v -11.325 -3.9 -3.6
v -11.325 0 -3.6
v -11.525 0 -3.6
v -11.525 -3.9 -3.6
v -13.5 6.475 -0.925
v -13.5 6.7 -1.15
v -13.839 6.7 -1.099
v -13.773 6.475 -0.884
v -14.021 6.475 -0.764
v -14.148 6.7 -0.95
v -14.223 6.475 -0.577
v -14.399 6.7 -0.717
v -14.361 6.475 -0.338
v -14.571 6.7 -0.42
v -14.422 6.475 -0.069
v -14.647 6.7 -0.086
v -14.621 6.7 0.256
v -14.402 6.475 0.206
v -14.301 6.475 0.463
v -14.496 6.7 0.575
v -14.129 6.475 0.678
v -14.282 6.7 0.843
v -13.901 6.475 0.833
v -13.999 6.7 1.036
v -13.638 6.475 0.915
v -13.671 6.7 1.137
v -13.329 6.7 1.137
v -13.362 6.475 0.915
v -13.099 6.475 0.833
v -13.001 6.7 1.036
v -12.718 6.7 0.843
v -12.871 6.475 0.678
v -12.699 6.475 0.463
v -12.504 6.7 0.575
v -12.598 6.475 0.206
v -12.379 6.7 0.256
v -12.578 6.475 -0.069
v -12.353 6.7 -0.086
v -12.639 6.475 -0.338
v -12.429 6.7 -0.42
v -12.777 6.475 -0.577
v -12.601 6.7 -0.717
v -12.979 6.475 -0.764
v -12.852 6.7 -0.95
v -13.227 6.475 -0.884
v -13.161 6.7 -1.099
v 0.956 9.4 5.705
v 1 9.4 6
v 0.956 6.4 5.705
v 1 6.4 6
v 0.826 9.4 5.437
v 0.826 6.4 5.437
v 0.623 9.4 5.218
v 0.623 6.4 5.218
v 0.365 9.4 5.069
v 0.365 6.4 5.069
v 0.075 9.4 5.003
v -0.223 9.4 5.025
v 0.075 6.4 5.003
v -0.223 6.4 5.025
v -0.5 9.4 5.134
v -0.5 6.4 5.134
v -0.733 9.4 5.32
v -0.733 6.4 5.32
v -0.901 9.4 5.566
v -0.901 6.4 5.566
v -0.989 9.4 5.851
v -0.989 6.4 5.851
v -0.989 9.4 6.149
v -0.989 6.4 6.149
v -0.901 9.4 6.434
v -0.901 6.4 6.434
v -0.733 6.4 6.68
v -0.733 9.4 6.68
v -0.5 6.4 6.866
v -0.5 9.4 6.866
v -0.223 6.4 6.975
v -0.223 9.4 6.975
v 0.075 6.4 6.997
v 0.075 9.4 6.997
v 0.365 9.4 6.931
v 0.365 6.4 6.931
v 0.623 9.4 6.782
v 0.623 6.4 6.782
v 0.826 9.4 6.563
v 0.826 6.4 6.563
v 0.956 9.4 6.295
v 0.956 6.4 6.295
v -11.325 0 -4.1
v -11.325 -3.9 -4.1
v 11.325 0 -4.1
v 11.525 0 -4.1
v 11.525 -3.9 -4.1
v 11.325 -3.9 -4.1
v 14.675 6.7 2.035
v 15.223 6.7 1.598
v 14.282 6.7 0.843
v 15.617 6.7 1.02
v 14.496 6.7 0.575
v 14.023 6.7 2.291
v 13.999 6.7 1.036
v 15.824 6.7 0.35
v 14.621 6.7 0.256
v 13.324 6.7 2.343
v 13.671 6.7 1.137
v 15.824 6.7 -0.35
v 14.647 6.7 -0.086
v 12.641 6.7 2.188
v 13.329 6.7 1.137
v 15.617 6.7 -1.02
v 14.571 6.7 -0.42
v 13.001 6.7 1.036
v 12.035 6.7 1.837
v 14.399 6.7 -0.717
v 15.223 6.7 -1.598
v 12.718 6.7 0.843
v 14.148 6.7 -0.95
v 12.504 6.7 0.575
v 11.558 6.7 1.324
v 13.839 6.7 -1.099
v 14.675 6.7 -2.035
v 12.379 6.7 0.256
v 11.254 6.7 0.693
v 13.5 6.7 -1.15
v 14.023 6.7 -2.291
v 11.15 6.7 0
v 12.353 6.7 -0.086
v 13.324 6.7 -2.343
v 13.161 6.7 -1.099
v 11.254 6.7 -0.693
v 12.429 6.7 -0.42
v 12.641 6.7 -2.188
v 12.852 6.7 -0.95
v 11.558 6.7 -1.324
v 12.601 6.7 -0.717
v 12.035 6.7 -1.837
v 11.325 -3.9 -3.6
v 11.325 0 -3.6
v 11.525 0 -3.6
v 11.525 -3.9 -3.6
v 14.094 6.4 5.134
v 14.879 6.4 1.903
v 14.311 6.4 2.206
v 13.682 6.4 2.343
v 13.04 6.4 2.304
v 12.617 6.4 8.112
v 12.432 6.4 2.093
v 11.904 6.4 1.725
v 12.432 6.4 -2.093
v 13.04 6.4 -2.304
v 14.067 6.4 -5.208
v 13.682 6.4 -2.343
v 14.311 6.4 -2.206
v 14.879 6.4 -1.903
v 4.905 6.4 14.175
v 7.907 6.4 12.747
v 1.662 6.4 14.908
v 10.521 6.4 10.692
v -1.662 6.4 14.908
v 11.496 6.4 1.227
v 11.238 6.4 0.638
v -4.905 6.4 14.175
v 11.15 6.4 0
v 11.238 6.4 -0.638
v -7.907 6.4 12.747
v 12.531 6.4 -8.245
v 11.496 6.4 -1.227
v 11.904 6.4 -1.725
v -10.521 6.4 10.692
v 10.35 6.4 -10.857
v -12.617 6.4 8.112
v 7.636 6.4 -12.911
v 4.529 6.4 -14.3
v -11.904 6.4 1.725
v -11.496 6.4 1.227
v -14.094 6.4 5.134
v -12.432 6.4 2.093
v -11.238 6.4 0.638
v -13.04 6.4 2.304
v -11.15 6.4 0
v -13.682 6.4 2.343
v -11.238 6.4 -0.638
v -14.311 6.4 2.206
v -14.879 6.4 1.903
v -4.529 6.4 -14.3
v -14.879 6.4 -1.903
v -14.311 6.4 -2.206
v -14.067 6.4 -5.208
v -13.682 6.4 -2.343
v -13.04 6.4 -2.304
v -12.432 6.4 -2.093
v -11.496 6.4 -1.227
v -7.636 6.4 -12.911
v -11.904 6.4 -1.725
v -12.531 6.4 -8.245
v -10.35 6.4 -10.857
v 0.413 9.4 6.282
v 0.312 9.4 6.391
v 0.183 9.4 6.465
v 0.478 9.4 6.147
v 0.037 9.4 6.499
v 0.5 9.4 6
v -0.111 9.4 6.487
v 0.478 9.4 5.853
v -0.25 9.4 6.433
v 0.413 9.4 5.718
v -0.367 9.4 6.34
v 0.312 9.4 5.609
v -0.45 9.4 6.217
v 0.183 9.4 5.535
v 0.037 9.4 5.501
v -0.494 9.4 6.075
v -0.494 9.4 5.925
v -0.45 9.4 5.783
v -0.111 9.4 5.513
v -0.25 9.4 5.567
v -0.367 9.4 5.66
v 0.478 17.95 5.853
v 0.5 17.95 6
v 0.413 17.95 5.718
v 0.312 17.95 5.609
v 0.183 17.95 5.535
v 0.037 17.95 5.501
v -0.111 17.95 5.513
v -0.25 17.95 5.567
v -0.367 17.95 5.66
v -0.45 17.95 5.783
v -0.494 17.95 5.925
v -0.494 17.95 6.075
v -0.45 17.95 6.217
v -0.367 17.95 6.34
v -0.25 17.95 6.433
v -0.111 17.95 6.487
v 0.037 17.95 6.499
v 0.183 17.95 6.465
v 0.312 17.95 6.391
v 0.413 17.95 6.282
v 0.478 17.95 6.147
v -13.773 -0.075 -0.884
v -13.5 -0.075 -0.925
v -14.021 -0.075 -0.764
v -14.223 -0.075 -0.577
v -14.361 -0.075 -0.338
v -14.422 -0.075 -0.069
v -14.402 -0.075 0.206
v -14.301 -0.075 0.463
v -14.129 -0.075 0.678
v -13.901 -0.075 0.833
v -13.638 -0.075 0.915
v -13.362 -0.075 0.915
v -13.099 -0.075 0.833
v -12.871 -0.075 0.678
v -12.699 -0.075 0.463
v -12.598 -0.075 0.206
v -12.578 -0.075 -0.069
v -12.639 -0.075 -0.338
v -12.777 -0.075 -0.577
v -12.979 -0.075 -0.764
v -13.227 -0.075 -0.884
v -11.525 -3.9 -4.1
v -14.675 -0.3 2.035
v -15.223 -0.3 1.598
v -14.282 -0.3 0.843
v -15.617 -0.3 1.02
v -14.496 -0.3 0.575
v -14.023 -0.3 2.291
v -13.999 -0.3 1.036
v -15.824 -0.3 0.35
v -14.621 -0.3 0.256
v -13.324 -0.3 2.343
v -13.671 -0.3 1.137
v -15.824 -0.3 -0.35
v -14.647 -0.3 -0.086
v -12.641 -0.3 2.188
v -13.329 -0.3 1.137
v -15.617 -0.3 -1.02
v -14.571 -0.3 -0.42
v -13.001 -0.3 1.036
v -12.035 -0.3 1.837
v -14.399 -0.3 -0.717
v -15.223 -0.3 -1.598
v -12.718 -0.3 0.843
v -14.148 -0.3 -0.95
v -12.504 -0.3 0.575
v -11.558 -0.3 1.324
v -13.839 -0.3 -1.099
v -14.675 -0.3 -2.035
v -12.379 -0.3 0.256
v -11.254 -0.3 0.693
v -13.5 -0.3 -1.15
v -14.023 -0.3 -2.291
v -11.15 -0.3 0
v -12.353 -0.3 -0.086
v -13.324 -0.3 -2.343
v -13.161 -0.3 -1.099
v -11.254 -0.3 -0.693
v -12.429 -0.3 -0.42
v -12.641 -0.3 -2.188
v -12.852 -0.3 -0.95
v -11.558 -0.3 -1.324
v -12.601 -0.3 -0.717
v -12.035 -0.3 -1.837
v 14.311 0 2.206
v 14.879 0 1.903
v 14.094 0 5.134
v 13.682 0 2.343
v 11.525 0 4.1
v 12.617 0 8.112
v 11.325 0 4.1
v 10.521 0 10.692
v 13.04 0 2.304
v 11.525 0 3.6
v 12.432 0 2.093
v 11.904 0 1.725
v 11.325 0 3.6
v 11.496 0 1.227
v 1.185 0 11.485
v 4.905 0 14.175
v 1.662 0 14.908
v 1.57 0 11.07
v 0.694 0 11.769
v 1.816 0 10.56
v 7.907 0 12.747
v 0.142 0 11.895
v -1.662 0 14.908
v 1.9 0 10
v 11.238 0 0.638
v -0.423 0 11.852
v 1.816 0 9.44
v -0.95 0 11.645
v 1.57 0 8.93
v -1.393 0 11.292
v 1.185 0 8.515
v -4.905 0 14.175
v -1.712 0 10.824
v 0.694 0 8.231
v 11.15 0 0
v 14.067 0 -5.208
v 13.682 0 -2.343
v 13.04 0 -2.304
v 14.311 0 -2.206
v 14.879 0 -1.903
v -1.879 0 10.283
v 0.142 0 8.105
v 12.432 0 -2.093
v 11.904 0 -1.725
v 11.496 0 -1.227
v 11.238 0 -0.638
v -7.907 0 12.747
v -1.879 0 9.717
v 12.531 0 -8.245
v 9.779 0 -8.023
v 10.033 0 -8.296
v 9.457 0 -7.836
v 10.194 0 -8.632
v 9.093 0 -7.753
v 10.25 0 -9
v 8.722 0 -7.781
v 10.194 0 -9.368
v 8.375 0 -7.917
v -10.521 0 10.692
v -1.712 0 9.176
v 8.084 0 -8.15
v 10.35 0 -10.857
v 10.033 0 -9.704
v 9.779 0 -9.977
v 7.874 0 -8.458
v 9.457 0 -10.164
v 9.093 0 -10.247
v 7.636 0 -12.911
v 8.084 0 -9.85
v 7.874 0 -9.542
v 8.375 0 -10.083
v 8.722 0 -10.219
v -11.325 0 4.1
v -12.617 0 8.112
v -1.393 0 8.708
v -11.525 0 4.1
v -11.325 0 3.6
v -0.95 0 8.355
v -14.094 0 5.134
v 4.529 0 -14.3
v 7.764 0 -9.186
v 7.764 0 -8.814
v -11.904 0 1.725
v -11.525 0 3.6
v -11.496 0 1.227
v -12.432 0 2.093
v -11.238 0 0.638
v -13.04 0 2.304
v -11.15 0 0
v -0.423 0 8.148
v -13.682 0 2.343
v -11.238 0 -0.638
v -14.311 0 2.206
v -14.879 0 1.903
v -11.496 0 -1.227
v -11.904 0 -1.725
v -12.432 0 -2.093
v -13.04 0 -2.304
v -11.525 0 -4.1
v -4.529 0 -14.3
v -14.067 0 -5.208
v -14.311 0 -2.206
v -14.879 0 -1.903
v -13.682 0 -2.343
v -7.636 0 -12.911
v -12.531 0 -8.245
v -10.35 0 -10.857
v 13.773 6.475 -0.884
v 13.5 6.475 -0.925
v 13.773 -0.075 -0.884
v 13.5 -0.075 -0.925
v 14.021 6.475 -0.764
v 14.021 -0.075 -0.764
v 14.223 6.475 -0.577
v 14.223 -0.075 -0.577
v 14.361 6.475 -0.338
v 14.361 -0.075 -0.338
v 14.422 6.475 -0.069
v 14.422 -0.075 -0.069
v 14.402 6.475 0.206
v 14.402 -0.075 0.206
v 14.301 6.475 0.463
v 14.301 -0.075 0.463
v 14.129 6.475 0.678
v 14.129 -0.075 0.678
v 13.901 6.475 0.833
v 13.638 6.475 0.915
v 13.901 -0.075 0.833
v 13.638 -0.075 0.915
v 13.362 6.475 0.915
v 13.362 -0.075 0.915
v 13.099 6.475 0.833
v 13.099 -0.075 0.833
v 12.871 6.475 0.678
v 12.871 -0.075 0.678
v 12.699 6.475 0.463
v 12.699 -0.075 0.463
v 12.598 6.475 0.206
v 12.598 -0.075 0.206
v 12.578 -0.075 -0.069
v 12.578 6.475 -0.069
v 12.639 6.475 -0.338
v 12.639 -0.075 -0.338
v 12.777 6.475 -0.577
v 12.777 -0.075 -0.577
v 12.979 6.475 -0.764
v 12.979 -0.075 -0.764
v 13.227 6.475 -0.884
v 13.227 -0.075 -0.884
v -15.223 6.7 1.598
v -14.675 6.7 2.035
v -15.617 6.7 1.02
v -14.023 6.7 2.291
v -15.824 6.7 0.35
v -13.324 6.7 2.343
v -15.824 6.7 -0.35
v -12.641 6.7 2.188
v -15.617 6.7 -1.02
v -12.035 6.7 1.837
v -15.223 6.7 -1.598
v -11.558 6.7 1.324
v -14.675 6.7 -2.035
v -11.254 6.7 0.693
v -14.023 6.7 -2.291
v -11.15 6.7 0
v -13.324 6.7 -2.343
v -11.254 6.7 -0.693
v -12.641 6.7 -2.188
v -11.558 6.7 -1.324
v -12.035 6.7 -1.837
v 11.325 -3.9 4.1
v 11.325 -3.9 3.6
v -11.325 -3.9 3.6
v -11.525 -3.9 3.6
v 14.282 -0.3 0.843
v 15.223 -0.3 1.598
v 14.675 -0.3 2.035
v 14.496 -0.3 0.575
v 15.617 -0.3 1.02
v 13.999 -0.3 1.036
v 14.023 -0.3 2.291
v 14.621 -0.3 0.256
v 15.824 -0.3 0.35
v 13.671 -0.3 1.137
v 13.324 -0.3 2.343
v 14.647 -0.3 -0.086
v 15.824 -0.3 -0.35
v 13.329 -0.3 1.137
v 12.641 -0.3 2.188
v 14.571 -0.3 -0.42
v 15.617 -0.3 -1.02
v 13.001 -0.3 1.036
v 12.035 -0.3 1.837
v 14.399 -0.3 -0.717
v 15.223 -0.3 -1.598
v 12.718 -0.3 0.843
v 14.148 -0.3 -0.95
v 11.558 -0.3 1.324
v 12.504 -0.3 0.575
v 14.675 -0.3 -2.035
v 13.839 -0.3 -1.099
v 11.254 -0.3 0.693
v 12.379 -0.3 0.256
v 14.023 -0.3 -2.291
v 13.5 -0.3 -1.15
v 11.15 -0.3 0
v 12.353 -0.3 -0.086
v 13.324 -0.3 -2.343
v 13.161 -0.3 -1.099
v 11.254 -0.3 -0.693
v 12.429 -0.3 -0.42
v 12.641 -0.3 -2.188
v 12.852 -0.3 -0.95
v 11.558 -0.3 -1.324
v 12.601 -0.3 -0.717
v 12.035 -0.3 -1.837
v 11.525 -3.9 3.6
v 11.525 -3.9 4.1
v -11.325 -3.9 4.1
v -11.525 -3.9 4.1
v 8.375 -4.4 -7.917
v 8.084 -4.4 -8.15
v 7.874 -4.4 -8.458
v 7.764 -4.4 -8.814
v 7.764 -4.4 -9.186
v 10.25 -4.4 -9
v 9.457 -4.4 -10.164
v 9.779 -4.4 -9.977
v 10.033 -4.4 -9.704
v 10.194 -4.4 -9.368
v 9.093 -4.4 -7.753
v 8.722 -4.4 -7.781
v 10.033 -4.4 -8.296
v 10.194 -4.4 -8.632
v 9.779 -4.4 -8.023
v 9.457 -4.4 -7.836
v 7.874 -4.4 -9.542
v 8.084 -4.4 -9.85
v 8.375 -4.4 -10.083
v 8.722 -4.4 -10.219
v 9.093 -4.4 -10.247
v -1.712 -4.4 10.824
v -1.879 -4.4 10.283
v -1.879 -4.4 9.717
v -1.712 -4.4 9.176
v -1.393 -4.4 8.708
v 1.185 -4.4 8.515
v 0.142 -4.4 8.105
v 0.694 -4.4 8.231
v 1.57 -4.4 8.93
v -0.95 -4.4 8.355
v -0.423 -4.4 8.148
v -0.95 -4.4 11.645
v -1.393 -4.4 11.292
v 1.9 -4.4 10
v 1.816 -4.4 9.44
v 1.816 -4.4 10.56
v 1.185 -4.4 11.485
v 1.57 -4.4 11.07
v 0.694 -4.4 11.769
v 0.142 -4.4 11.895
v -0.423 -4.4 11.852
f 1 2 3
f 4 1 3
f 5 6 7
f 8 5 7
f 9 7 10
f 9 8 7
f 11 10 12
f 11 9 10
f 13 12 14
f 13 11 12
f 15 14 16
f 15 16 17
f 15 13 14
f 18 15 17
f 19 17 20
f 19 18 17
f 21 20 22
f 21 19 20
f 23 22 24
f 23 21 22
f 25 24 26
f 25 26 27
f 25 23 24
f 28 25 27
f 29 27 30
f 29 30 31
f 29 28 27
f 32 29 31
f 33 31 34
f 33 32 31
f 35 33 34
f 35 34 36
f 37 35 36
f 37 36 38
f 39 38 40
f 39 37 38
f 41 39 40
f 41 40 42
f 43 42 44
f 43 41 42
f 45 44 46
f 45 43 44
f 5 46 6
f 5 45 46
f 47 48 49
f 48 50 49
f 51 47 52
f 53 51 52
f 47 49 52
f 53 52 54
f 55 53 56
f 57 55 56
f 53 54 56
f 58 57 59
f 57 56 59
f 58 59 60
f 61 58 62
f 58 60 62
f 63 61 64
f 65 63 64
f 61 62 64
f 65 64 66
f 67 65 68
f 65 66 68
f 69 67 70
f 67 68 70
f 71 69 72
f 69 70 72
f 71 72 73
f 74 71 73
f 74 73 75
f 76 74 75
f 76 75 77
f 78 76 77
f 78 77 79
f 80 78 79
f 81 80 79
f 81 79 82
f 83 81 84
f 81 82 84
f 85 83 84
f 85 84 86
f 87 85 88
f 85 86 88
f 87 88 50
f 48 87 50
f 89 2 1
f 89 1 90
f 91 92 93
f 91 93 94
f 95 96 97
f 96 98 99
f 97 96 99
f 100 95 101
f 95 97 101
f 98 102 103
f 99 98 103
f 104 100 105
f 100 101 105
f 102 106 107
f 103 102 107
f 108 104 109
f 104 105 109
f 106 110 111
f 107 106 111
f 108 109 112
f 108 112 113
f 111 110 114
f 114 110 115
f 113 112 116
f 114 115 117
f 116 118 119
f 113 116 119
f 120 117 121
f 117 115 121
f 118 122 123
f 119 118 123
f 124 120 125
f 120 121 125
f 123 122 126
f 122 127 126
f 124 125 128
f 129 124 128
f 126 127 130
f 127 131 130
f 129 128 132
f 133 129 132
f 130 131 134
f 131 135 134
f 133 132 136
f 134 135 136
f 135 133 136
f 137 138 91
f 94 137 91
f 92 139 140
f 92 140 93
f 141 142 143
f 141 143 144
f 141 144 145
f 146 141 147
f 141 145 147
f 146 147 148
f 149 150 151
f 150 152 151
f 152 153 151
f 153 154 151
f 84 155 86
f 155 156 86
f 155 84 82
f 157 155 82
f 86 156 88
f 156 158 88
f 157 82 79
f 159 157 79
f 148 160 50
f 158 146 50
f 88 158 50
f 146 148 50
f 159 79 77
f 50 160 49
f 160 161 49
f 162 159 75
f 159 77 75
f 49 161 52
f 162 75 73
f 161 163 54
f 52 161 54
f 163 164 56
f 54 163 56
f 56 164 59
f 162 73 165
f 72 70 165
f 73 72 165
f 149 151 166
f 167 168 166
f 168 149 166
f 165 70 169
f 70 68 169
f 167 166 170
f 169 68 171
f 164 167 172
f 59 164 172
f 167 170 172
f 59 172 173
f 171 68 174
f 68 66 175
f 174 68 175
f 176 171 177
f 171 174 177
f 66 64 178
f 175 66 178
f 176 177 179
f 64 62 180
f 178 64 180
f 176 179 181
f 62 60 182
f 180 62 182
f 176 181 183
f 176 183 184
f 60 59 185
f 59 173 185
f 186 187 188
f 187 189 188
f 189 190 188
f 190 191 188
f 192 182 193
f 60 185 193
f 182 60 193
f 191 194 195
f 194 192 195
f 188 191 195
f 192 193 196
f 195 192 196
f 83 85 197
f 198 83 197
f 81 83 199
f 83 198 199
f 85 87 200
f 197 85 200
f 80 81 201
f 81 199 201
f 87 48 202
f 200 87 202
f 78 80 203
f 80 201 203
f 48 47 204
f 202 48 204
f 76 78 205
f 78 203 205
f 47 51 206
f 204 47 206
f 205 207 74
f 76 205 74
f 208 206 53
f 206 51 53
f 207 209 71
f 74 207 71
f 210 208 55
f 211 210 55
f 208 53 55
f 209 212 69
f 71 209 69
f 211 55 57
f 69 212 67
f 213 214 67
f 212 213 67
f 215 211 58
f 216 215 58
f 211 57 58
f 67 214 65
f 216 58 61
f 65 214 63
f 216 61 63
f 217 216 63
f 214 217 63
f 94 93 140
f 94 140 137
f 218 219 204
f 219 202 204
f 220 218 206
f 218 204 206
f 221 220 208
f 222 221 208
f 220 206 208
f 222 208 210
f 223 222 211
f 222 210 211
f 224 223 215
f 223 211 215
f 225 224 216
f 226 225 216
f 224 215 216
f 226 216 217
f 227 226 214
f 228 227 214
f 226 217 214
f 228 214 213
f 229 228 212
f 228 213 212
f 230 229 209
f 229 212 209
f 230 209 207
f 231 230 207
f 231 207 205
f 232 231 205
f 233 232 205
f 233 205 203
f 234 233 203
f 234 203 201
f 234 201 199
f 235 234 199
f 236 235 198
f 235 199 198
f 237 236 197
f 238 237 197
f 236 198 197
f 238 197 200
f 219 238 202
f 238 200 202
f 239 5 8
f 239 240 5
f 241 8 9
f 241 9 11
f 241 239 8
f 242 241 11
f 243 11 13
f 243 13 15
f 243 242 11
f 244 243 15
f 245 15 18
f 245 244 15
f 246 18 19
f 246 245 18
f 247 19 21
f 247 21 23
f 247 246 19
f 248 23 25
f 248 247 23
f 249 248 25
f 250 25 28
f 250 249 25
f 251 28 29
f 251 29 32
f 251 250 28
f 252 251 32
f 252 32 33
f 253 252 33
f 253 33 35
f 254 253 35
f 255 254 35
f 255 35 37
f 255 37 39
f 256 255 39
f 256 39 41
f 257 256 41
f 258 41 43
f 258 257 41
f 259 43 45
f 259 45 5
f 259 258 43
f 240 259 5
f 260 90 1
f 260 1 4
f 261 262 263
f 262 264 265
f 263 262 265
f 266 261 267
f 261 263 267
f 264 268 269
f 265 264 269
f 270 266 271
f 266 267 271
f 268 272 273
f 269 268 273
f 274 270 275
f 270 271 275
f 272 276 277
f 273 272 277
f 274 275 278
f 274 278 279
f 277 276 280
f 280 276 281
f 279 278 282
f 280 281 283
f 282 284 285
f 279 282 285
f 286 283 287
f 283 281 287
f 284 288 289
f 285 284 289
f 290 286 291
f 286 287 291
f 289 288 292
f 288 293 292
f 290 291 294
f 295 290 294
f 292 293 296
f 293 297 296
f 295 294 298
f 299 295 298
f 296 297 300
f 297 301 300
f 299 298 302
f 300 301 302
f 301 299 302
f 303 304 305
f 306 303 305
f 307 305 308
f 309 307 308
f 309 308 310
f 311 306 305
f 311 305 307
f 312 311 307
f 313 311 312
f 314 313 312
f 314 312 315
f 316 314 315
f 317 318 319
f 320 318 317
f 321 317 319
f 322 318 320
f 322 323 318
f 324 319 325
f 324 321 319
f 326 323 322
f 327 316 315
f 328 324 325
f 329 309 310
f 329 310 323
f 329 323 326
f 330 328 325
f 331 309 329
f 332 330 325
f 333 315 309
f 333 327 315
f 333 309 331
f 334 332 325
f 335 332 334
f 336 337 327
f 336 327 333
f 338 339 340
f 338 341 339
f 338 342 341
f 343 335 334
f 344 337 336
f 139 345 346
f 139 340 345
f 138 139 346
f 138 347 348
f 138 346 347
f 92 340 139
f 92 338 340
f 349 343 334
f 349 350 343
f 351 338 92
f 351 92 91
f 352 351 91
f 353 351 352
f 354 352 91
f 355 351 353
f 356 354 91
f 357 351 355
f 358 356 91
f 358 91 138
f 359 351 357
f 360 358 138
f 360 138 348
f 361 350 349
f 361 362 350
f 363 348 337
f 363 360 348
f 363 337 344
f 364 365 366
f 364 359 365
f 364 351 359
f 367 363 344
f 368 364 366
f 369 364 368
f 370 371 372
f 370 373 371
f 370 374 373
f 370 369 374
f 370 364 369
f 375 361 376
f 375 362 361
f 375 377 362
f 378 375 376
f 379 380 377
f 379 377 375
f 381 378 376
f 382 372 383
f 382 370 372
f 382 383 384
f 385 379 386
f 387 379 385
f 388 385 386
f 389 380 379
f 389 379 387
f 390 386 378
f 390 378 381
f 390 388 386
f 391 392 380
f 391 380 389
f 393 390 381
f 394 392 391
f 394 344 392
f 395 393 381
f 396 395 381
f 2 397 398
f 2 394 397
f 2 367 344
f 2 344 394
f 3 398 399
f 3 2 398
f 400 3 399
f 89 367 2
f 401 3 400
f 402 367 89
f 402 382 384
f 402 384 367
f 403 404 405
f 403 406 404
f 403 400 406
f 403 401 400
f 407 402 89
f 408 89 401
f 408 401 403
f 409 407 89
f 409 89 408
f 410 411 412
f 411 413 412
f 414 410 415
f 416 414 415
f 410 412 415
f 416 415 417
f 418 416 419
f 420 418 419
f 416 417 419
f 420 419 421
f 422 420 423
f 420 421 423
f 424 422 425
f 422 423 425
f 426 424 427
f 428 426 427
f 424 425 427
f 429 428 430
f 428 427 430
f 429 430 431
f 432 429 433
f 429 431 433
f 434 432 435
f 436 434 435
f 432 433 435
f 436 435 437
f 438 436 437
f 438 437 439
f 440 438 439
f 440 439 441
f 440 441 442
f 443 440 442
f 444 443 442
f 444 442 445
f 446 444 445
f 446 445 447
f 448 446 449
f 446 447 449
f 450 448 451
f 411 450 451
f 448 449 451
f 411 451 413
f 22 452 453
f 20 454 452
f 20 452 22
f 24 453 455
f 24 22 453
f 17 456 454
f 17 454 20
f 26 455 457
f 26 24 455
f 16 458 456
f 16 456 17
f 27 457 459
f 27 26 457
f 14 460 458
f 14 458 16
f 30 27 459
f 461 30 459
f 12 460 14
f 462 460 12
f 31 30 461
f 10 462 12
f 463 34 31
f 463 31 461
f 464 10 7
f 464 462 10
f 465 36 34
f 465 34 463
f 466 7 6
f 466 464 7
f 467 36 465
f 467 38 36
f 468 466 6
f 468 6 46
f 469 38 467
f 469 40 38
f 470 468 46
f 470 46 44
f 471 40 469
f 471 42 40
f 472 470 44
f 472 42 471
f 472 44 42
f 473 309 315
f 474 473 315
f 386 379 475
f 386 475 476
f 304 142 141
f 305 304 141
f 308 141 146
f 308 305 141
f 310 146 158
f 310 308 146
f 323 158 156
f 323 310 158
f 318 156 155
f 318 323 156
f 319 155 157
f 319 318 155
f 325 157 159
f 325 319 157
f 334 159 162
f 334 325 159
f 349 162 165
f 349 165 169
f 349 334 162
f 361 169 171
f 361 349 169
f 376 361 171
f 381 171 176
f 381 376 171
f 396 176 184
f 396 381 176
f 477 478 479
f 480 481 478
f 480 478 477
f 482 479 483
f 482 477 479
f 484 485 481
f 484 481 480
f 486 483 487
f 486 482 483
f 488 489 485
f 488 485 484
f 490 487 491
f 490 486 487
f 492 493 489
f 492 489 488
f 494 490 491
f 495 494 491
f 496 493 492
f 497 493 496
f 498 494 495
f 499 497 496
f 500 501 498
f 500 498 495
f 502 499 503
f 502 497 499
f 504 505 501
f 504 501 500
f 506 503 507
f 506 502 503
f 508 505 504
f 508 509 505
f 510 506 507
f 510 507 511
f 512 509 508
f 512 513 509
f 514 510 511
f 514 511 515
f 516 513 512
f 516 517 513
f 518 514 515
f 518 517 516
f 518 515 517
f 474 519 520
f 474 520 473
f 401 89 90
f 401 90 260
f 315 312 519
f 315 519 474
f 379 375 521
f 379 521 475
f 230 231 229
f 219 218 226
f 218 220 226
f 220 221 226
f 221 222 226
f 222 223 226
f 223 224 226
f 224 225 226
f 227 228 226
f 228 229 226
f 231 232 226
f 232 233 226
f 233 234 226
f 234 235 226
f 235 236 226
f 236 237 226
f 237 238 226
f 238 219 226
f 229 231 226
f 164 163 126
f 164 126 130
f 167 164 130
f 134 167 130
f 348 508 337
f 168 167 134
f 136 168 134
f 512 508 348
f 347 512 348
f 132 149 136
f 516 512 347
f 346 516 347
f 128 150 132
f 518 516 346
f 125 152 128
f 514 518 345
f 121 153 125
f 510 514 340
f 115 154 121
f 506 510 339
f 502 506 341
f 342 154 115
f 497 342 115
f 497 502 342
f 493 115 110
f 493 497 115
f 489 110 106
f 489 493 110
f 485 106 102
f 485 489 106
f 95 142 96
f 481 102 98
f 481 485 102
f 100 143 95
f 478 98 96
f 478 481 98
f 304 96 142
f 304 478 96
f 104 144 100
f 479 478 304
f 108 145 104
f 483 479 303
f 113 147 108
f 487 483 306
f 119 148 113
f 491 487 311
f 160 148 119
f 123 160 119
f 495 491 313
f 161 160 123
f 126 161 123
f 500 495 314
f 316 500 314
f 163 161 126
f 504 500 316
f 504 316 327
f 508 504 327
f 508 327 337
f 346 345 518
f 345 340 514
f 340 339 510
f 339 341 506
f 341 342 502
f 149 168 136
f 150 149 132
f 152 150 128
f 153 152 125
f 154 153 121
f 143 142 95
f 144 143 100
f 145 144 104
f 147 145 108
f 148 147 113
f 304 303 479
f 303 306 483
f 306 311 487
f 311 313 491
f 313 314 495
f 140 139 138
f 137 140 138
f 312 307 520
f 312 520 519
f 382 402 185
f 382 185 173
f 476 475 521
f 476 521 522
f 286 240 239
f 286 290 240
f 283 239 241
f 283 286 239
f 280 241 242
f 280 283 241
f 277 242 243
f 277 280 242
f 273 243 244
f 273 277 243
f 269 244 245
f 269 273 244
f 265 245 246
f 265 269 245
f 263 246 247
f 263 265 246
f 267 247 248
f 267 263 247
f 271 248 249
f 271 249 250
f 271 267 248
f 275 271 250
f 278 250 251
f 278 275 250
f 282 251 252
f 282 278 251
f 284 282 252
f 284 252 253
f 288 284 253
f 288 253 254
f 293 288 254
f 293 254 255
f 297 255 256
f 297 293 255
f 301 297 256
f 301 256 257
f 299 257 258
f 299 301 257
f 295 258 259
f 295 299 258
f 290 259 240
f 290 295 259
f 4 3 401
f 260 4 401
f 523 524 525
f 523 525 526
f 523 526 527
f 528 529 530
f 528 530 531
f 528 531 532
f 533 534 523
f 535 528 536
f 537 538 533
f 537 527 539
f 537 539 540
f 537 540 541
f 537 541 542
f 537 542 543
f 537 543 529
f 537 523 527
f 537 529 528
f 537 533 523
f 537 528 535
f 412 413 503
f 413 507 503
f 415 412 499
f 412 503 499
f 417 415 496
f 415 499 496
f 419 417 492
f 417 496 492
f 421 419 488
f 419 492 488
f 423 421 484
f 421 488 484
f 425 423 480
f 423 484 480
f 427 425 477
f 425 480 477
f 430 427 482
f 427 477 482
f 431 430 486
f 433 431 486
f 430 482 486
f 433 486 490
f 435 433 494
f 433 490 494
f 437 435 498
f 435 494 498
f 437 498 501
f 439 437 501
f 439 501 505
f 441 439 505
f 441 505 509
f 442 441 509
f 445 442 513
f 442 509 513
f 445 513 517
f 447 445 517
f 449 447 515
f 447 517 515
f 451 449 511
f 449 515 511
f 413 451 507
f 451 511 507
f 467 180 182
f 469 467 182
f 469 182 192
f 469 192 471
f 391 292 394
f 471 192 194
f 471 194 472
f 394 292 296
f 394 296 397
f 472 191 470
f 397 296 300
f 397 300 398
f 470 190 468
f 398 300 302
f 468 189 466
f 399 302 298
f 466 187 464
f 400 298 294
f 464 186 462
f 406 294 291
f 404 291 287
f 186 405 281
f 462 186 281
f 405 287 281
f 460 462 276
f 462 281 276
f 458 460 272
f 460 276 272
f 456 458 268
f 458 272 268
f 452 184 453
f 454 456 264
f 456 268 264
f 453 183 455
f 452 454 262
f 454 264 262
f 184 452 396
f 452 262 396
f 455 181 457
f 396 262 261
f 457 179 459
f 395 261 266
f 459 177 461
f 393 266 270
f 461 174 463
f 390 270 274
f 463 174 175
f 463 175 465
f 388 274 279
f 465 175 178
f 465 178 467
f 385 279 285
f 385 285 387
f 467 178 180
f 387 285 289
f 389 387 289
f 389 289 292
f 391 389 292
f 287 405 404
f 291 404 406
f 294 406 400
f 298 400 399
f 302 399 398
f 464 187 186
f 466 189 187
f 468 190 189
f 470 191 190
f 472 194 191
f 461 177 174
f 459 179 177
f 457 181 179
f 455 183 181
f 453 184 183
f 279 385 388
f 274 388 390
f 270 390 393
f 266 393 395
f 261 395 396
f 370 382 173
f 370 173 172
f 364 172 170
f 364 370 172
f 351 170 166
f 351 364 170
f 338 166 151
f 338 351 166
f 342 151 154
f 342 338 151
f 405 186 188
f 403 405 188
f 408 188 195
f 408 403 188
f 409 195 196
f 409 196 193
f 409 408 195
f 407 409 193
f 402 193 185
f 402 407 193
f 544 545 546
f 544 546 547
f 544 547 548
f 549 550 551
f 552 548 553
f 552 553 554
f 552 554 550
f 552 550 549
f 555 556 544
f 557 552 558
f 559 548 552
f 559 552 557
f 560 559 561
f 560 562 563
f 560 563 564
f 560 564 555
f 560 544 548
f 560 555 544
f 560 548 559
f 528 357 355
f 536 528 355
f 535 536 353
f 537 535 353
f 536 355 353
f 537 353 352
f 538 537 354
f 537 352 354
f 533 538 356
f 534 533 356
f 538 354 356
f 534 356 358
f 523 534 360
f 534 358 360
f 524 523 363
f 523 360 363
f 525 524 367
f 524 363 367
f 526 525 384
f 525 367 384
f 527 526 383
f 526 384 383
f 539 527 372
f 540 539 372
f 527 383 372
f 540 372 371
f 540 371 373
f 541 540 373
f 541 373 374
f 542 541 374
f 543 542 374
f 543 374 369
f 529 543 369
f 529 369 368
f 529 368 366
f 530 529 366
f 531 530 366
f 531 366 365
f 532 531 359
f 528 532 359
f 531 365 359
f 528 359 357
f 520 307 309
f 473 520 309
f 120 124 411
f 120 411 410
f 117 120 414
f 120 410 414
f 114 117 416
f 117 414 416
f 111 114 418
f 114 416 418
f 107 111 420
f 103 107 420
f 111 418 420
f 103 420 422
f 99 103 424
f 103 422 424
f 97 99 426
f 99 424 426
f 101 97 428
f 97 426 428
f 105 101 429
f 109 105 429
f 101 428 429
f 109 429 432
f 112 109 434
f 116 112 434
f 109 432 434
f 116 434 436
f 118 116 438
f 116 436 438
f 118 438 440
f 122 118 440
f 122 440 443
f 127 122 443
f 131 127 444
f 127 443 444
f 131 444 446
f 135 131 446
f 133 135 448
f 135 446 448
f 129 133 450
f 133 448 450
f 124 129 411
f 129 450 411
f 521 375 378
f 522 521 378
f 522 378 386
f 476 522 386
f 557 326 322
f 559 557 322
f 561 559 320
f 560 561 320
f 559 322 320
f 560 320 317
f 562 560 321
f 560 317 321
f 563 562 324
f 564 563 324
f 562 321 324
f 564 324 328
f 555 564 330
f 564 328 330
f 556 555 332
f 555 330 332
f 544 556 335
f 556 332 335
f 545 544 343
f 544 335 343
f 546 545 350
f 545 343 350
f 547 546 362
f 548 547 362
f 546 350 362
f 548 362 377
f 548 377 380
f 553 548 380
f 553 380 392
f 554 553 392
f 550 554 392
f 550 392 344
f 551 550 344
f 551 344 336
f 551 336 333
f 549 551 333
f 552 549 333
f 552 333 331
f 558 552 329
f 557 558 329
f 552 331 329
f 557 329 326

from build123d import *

# Parameters (mm, degrees)
BOSS_EXTRUDE1_DEPTH = 6.4
BOSS_EXTRUDE2_START = -6.7
SKETCH4_R           = 2.35
BOSS_EXTRUDE2_DEPTH = 7
SKETCH7_R           = 1.9
SKETCH7_R_2         = 1.25
BOSS_EXTRUDE3_DEPTH = 4.4
SKETCH8_W           = 0.2
SKETCH8_H           = 0.5
BOSS_EXTRUDE4_DEPTH = 3.9


with BuildPart() as part:
    # Sketch1 → Boss-Extrude1 (new body)
    with BuildSketch(Plane(origin=(0, 0, 0), x_dir=(1, 0, 0), z_dir=(0, 1, 0))):
        with BuildLine():
            Line((-4.52879675, 14.3), (4.52879675, 14.3))
            ThreePointArc((4.52879675, 14.3), (0, -15), (-4.52879675, 14.3))
        make_face()
    extrude(amount=BOSS_EXTRUDE1_DEPTH)

    # Sketch3 → Revolve1 (revolve)
    with BuildSketch(Plane.XY.offset(6)):
        Polygon((0, 17.95), (0.5, 17.95), (0.5, 9.4), (1, 9.4), (1, 6.4), (0, 6.4), align=None)
    revolve(axis=Axis((0, 6.4, 6), (0, 1, 0)))

    # Sketch4 → Boss-Extrude2 (add)
    with BuildSketch(Plane(origin=(0, 6.4, 0), x_dir=(1, 0, 0), z_dir=(0, 1, 0)).offset(BOSS_EXTRUDE2_START)):
        with Locations((-13.5, 0)):
            Circle(SKETCH4_R)
    boss_extrude2 = extrude(amount=BOSS_EXTRUDE2_DEPTH)

    # Sketch6 → Ø1.85 (1.85) Diameter Hole1 (revolve, cut)
    with BuildSketch(Plane(origin=(-13.5, -0.3, 0), x_dir=(0, 0, -1), z_dir=(1, 0, 0))):
        Polygon((0, 0), (0, 7), (1.15, 7), (0.925, 6.775), (0.925, 0.225), (1.15, 0), align=None)
    f_1_85_1_85_diameter_hole1 = revolve(axis=Axis((-13.5, -6.65, 0), (0, 1, 0)), mode=Mode.SUBTRACT)

    # Mirror1: Boss-Extrude2, Ø1.85 (1.85) Diameter Hole1 across plane
    add(boss_extrude2.mirror(Plane(origin=(0, 0, 0), x_dir=(0, 0, 1), z_dir=(1, 0, 0))))
    add(f_1_85_1_85_diameter_hole1.mirror(Plane(origin=(0, 0, 0), x_dir=(0, 0, 1), z_dir=(1, 0, 0))), mode=Mode.SUBTRACT)

    # Sketch7 → Boss-Extrude3 (add)
    with BuildSketch(Plane.XZ):
        with Locations((0, 10)):
            Circle(SKETCH7_R)
        with Locations((9, -9)):
            Circle(SKETCH7_R_2)
    extrude(amount=BOSS_EXTRUDE3_DEPTH)

    # Sketch8 → Boss-Extrude4 (add)
    with BuildSketch(Plane(origin=(0, 0, 0), x_dir=(-1, 0, 0), z_dir=(0, -1, 0))):
        with Locations((-11.425, -3.85)):
            Rectangle(SKETCH8_W, SKETCH8_H)
        with Locations((11.425, -3.85)):
            Rectangle(SKETCH8_W, SKETCH8_H)
        with Locations((-11.425, 3.85)):
            Rectangle(SKETCH8_W, SKETCH8_H)
        with Locations((11.425, 3.85)):
            Rectangle(SKETCH8_W, SKETCH8_H)
    extrude(amount=BOSS_EXTRUDE4_DEPTH)


solid = part.part
